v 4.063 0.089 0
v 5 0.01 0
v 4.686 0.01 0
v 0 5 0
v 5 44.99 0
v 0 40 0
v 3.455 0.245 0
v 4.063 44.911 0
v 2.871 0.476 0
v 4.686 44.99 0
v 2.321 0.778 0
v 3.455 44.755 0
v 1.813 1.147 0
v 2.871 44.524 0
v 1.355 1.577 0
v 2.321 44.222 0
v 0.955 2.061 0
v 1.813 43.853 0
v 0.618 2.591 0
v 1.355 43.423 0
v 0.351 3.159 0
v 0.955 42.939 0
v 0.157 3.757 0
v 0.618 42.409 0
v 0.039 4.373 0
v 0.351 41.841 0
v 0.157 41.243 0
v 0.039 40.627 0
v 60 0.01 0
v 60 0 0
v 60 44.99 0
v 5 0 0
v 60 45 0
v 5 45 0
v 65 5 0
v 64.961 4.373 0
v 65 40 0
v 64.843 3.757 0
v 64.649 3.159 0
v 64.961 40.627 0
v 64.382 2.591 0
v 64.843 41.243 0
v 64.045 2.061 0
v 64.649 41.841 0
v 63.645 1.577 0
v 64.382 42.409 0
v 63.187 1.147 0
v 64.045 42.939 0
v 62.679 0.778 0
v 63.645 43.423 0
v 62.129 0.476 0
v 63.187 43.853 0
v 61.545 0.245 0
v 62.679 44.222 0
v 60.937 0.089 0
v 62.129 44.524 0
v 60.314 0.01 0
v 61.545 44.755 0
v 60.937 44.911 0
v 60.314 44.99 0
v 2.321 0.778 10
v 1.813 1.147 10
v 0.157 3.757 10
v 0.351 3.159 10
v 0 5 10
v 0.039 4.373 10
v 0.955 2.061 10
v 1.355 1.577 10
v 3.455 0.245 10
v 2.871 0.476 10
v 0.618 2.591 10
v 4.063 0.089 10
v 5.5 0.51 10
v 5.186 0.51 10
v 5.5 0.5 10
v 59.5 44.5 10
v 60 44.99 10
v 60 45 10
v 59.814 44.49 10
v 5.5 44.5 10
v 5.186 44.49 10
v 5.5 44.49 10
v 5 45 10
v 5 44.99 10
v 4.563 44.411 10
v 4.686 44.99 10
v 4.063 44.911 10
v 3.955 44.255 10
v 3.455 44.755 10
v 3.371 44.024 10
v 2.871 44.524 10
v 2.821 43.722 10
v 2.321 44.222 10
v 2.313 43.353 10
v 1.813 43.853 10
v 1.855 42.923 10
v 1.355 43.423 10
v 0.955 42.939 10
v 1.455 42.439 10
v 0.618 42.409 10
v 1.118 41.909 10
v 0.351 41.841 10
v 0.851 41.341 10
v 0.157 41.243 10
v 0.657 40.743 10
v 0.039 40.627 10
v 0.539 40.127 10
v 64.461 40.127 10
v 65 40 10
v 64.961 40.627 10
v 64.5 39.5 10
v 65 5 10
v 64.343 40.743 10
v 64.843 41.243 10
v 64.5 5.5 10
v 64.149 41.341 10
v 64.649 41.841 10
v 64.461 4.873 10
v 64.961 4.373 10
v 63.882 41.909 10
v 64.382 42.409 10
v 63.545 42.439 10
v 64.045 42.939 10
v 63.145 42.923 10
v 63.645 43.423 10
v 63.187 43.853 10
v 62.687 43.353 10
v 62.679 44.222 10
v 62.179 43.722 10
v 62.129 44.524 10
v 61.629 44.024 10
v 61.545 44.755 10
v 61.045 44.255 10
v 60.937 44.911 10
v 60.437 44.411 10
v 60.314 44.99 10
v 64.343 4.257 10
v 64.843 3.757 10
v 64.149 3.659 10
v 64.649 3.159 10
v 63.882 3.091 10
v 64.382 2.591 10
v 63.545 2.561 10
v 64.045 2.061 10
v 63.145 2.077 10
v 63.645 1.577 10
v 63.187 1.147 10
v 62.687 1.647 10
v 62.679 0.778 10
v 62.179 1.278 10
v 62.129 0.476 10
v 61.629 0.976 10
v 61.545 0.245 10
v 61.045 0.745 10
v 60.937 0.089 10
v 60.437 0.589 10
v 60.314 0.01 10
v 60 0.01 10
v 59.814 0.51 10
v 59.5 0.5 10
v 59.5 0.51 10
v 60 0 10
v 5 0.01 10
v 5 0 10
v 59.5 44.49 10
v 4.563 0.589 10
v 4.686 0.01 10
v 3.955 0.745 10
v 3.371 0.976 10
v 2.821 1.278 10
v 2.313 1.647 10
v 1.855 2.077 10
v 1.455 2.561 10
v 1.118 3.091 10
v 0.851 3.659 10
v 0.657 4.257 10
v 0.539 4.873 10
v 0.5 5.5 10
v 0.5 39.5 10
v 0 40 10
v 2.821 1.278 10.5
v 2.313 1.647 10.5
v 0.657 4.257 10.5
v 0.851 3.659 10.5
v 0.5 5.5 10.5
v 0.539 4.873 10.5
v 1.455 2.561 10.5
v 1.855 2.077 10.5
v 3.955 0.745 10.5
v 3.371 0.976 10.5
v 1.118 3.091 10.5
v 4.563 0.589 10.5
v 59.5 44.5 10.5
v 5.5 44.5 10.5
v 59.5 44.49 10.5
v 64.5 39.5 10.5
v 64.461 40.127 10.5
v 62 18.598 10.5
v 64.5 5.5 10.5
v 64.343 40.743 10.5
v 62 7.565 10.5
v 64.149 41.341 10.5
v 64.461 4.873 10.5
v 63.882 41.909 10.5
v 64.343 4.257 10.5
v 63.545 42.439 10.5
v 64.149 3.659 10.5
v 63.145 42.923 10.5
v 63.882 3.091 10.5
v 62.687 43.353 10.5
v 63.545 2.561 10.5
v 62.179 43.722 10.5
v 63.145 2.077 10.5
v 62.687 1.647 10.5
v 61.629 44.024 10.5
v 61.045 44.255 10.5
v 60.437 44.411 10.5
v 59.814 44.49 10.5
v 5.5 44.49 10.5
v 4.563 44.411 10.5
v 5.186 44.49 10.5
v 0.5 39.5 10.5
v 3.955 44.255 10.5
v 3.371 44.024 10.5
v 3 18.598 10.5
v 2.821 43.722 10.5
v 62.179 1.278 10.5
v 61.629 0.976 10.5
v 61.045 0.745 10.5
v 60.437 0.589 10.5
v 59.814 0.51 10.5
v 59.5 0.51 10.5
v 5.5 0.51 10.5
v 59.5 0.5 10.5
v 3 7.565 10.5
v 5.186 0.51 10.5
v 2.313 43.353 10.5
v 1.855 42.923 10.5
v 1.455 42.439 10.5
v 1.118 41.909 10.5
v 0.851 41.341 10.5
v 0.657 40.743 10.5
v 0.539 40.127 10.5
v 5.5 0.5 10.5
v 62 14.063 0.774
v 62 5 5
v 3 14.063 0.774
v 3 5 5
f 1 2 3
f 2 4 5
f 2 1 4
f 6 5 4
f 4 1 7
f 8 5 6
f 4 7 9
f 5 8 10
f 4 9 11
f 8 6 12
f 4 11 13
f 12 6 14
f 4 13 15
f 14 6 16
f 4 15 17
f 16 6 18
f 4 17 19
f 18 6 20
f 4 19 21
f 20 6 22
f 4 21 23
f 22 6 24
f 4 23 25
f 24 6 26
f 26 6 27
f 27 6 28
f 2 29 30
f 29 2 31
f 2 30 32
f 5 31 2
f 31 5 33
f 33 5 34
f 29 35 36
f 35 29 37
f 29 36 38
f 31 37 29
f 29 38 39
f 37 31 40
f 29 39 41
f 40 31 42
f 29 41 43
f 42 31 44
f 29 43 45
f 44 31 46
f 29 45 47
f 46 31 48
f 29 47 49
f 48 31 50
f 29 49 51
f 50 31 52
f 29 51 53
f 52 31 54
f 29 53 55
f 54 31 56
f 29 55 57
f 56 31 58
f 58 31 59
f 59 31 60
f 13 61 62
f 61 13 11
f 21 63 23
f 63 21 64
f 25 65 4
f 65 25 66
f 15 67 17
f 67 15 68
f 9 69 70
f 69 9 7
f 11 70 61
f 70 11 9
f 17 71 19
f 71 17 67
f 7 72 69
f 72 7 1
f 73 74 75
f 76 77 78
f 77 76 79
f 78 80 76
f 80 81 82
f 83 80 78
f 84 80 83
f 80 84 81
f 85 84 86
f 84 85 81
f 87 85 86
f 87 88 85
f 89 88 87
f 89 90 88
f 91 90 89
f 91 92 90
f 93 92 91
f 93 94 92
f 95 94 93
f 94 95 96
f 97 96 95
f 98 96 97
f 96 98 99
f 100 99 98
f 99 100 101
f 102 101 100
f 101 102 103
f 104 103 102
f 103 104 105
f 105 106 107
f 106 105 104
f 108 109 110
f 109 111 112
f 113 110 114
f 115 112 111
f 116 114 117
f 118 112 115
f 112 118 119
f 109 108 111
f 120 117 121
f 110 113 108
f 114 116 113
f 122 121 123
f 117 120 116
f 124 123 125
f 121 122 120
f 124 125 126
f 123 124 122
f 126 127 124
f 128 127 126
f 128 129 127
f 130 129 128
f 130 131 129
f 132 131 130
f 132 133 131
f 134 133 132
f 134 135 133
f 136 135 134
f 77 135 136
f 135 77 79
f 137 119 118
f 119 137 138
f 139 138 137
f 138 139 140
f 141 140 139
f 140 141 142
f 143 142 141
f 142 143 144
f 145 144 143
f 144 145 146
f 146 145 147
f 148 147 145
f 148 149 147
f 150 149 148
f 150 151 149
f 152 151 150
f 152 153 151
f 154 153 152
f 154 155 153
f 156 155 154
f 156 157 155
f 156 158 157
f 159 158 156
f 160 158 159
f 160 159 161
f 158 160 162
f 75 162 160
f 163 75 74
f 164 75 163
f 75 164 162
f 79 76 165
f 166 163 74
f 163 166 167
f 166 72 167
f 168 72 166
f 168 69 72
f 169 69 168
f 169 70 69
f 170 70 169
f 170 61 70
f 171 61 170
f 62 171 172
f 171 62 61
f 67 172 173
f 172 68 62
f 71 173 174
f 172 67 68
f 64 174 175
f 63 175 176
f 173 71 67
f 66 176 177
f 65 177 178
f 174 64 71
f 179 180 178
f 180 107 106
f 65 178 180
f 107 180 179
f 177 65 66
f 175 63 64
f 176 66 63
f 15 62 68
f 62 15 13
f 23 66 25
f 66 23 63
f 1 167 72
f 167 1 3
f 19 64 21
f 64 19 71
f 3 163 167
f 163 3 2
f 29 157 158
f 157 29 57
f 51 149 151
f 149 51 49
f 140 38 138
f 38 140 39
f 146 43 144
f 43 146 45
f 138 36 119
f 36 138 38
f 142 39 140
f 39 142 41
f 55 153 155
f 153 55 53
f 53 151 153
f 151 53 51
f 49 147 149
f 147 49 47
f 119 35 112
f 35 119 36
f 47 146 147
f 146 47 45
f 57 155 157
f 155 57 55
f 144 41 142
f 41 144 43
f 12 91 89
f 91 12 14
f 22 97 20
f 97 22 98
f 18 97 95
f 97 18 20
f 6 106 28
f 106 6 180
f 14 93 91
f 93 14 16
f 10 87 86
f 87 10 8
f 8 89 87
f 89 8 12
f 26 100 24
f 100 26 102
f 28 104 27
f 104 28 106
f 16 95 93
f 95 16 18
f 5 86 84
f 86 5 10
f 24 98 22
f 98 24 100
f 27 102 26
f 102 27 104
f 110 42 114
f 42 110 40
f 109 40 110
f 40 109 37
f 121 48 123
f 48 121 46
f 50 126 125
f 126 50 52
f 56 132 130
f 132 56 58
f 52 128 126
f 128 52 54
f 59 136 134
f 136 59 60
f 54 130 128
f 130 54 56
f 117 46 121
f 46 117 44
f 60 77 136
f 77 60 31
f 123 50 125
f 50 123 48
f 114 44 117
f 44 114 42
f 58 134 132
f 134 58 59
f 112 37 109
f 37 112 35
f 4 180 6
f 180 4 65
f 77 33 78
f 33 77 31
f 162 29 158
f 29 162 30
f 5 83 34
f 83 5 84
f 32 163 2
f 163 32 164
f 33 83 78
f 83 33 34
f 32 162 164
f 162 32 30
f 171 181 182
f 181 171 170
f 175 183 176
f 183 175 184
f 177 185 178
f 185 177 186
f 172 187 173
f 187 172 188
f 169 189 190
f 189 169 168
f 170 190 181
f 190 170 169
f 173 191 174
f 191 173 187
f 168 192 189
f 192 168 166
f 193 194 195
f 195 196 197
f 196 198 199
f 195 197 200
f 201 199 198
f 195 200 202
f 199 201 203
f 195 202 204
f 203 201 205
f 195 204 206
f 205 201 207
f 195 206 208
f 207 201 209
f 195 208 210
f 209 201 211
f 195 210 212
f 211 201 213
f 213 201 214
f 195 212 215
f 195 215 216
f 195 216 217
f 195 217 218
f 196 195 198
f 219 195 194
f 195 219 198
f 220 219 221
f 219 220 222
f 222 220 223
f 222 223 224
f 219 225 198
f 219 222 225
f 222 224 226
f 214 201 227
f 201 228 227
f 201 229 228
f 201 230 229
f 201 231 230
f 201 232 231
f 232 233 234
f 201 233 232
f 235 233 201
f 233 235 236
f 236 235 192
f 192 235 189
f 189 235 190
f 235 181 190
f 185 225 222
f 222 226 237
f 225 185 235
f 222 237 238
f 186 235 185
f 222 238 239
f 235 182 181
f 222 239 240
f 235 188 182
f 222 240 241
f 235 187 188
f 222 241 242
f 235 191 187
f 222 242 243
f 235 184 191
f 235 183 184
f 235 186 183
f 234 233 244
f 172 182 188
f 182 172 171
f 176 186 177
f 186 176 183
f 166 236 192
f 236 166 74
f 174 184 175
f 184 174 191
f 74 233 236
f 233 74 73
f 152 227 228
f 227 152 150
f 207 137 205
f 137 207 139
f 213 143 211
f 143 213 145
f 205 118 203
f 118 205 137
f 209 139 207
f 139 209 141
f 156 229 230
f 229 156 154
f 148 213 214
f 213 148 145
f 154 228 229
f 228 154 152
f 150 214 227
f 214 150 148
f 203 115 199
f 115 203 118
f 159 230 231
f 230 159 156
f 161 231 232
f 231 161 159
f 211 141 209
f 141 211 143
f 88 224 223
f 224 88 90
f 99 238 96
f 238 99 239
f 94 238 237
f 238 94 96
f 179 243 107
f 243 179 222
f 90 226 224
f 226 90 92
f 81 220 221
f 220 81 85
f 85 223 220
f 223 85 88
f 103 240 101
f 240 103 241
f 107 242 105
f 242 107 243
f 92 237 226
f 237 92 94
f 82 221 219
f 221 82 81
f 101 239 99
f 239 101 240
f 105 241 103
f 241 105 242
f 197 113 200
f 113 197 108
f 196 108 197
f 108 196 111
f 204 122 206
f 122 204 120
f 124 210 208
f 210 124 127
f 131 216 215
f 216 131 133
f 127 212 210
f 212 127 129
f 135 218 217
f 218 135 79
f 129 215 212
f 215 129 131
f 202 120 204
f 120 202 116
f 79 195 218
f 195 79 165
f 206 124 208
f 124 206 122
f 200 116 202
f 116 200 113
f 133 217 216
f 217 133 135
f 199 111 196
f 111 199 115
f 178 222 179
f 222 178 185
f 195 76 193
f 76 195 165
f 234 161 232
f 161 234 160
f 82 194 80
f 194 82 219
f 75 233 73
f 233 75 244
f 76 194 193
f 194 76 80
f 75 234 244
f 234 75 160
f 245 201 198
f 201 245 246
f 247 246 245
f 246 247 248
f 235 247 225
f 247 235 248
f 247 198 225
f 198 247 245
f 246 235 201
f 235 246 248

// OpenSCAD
cube_x=65;
cube_y=45;
cube_z=10;
rd=5;

slot_x=59;
slot_y=10;
slot_z=10;



module rectangle_round(cube_x,cube_y,cube_z){
	union(){
		//round coners
		intersection(){
			cube(cube_x,cube_y,cube_z);
			translate([rd,rd,cube_z/2]) #round_corner(cube_x,cube_y,cube_z);
		}
		intersection(){
			cube(cube_x,cube_y,cube_z);
			translate([cube_x-rd,rd,cube_z/2]) #round_corner(cube_x,cube_y,cube_z);
		}
		intersection(){
			cube(cube_x,cube_y,cube_z);
			translate([rd,cube_y-rd,cube_z/2]) #round_corner(cube_x,cube_y,cube_z);
		}
		intersection(){
			cube(cube_x,cube_y,cube_z);	
			translate([cube_x-rd,cube_y-rd,cube_z/2]) #round_corner(cube_x,cube_y,cube_z);
		}

		color([0,1,0,1]) translate([0,rd,0]) cube([cube_x,cube_y-2*rd,cube_z]);
		color([0,1,0,1]) translate([rd,0,0]) cube([cube_x-2*rd,cube_y,cube_z]);
	}

	module round_corner(cube_x,cube_y,cube_z){
		cylinder(h=cube_z,r=rd,$fn=50, center=true);
	}
}


//plate
//rotate([180,0,0]) translate([0,0,-cube_z-1]){
	difference(){
		union(){
			//main plate
			translate([0,0,0]) rectangle_round(cube_x,cube_y,cube_z);
			//top plate
			translate([0.5,0.5,cube_z]) rectangle_round(cube_x-1,cube_y-1,0.5);
		}
		//slot
		color([1,0,0,1]) translate([(cube_x-slot_x)/2,5,5]) rotate([-25,0,0])#cube([slot_x,slot_y,slot_z*2]);
	}
	//bottom plate
	//translate([1,1,0]) rectangle_round(cube_x-2,cube_y-2,1);

//}
